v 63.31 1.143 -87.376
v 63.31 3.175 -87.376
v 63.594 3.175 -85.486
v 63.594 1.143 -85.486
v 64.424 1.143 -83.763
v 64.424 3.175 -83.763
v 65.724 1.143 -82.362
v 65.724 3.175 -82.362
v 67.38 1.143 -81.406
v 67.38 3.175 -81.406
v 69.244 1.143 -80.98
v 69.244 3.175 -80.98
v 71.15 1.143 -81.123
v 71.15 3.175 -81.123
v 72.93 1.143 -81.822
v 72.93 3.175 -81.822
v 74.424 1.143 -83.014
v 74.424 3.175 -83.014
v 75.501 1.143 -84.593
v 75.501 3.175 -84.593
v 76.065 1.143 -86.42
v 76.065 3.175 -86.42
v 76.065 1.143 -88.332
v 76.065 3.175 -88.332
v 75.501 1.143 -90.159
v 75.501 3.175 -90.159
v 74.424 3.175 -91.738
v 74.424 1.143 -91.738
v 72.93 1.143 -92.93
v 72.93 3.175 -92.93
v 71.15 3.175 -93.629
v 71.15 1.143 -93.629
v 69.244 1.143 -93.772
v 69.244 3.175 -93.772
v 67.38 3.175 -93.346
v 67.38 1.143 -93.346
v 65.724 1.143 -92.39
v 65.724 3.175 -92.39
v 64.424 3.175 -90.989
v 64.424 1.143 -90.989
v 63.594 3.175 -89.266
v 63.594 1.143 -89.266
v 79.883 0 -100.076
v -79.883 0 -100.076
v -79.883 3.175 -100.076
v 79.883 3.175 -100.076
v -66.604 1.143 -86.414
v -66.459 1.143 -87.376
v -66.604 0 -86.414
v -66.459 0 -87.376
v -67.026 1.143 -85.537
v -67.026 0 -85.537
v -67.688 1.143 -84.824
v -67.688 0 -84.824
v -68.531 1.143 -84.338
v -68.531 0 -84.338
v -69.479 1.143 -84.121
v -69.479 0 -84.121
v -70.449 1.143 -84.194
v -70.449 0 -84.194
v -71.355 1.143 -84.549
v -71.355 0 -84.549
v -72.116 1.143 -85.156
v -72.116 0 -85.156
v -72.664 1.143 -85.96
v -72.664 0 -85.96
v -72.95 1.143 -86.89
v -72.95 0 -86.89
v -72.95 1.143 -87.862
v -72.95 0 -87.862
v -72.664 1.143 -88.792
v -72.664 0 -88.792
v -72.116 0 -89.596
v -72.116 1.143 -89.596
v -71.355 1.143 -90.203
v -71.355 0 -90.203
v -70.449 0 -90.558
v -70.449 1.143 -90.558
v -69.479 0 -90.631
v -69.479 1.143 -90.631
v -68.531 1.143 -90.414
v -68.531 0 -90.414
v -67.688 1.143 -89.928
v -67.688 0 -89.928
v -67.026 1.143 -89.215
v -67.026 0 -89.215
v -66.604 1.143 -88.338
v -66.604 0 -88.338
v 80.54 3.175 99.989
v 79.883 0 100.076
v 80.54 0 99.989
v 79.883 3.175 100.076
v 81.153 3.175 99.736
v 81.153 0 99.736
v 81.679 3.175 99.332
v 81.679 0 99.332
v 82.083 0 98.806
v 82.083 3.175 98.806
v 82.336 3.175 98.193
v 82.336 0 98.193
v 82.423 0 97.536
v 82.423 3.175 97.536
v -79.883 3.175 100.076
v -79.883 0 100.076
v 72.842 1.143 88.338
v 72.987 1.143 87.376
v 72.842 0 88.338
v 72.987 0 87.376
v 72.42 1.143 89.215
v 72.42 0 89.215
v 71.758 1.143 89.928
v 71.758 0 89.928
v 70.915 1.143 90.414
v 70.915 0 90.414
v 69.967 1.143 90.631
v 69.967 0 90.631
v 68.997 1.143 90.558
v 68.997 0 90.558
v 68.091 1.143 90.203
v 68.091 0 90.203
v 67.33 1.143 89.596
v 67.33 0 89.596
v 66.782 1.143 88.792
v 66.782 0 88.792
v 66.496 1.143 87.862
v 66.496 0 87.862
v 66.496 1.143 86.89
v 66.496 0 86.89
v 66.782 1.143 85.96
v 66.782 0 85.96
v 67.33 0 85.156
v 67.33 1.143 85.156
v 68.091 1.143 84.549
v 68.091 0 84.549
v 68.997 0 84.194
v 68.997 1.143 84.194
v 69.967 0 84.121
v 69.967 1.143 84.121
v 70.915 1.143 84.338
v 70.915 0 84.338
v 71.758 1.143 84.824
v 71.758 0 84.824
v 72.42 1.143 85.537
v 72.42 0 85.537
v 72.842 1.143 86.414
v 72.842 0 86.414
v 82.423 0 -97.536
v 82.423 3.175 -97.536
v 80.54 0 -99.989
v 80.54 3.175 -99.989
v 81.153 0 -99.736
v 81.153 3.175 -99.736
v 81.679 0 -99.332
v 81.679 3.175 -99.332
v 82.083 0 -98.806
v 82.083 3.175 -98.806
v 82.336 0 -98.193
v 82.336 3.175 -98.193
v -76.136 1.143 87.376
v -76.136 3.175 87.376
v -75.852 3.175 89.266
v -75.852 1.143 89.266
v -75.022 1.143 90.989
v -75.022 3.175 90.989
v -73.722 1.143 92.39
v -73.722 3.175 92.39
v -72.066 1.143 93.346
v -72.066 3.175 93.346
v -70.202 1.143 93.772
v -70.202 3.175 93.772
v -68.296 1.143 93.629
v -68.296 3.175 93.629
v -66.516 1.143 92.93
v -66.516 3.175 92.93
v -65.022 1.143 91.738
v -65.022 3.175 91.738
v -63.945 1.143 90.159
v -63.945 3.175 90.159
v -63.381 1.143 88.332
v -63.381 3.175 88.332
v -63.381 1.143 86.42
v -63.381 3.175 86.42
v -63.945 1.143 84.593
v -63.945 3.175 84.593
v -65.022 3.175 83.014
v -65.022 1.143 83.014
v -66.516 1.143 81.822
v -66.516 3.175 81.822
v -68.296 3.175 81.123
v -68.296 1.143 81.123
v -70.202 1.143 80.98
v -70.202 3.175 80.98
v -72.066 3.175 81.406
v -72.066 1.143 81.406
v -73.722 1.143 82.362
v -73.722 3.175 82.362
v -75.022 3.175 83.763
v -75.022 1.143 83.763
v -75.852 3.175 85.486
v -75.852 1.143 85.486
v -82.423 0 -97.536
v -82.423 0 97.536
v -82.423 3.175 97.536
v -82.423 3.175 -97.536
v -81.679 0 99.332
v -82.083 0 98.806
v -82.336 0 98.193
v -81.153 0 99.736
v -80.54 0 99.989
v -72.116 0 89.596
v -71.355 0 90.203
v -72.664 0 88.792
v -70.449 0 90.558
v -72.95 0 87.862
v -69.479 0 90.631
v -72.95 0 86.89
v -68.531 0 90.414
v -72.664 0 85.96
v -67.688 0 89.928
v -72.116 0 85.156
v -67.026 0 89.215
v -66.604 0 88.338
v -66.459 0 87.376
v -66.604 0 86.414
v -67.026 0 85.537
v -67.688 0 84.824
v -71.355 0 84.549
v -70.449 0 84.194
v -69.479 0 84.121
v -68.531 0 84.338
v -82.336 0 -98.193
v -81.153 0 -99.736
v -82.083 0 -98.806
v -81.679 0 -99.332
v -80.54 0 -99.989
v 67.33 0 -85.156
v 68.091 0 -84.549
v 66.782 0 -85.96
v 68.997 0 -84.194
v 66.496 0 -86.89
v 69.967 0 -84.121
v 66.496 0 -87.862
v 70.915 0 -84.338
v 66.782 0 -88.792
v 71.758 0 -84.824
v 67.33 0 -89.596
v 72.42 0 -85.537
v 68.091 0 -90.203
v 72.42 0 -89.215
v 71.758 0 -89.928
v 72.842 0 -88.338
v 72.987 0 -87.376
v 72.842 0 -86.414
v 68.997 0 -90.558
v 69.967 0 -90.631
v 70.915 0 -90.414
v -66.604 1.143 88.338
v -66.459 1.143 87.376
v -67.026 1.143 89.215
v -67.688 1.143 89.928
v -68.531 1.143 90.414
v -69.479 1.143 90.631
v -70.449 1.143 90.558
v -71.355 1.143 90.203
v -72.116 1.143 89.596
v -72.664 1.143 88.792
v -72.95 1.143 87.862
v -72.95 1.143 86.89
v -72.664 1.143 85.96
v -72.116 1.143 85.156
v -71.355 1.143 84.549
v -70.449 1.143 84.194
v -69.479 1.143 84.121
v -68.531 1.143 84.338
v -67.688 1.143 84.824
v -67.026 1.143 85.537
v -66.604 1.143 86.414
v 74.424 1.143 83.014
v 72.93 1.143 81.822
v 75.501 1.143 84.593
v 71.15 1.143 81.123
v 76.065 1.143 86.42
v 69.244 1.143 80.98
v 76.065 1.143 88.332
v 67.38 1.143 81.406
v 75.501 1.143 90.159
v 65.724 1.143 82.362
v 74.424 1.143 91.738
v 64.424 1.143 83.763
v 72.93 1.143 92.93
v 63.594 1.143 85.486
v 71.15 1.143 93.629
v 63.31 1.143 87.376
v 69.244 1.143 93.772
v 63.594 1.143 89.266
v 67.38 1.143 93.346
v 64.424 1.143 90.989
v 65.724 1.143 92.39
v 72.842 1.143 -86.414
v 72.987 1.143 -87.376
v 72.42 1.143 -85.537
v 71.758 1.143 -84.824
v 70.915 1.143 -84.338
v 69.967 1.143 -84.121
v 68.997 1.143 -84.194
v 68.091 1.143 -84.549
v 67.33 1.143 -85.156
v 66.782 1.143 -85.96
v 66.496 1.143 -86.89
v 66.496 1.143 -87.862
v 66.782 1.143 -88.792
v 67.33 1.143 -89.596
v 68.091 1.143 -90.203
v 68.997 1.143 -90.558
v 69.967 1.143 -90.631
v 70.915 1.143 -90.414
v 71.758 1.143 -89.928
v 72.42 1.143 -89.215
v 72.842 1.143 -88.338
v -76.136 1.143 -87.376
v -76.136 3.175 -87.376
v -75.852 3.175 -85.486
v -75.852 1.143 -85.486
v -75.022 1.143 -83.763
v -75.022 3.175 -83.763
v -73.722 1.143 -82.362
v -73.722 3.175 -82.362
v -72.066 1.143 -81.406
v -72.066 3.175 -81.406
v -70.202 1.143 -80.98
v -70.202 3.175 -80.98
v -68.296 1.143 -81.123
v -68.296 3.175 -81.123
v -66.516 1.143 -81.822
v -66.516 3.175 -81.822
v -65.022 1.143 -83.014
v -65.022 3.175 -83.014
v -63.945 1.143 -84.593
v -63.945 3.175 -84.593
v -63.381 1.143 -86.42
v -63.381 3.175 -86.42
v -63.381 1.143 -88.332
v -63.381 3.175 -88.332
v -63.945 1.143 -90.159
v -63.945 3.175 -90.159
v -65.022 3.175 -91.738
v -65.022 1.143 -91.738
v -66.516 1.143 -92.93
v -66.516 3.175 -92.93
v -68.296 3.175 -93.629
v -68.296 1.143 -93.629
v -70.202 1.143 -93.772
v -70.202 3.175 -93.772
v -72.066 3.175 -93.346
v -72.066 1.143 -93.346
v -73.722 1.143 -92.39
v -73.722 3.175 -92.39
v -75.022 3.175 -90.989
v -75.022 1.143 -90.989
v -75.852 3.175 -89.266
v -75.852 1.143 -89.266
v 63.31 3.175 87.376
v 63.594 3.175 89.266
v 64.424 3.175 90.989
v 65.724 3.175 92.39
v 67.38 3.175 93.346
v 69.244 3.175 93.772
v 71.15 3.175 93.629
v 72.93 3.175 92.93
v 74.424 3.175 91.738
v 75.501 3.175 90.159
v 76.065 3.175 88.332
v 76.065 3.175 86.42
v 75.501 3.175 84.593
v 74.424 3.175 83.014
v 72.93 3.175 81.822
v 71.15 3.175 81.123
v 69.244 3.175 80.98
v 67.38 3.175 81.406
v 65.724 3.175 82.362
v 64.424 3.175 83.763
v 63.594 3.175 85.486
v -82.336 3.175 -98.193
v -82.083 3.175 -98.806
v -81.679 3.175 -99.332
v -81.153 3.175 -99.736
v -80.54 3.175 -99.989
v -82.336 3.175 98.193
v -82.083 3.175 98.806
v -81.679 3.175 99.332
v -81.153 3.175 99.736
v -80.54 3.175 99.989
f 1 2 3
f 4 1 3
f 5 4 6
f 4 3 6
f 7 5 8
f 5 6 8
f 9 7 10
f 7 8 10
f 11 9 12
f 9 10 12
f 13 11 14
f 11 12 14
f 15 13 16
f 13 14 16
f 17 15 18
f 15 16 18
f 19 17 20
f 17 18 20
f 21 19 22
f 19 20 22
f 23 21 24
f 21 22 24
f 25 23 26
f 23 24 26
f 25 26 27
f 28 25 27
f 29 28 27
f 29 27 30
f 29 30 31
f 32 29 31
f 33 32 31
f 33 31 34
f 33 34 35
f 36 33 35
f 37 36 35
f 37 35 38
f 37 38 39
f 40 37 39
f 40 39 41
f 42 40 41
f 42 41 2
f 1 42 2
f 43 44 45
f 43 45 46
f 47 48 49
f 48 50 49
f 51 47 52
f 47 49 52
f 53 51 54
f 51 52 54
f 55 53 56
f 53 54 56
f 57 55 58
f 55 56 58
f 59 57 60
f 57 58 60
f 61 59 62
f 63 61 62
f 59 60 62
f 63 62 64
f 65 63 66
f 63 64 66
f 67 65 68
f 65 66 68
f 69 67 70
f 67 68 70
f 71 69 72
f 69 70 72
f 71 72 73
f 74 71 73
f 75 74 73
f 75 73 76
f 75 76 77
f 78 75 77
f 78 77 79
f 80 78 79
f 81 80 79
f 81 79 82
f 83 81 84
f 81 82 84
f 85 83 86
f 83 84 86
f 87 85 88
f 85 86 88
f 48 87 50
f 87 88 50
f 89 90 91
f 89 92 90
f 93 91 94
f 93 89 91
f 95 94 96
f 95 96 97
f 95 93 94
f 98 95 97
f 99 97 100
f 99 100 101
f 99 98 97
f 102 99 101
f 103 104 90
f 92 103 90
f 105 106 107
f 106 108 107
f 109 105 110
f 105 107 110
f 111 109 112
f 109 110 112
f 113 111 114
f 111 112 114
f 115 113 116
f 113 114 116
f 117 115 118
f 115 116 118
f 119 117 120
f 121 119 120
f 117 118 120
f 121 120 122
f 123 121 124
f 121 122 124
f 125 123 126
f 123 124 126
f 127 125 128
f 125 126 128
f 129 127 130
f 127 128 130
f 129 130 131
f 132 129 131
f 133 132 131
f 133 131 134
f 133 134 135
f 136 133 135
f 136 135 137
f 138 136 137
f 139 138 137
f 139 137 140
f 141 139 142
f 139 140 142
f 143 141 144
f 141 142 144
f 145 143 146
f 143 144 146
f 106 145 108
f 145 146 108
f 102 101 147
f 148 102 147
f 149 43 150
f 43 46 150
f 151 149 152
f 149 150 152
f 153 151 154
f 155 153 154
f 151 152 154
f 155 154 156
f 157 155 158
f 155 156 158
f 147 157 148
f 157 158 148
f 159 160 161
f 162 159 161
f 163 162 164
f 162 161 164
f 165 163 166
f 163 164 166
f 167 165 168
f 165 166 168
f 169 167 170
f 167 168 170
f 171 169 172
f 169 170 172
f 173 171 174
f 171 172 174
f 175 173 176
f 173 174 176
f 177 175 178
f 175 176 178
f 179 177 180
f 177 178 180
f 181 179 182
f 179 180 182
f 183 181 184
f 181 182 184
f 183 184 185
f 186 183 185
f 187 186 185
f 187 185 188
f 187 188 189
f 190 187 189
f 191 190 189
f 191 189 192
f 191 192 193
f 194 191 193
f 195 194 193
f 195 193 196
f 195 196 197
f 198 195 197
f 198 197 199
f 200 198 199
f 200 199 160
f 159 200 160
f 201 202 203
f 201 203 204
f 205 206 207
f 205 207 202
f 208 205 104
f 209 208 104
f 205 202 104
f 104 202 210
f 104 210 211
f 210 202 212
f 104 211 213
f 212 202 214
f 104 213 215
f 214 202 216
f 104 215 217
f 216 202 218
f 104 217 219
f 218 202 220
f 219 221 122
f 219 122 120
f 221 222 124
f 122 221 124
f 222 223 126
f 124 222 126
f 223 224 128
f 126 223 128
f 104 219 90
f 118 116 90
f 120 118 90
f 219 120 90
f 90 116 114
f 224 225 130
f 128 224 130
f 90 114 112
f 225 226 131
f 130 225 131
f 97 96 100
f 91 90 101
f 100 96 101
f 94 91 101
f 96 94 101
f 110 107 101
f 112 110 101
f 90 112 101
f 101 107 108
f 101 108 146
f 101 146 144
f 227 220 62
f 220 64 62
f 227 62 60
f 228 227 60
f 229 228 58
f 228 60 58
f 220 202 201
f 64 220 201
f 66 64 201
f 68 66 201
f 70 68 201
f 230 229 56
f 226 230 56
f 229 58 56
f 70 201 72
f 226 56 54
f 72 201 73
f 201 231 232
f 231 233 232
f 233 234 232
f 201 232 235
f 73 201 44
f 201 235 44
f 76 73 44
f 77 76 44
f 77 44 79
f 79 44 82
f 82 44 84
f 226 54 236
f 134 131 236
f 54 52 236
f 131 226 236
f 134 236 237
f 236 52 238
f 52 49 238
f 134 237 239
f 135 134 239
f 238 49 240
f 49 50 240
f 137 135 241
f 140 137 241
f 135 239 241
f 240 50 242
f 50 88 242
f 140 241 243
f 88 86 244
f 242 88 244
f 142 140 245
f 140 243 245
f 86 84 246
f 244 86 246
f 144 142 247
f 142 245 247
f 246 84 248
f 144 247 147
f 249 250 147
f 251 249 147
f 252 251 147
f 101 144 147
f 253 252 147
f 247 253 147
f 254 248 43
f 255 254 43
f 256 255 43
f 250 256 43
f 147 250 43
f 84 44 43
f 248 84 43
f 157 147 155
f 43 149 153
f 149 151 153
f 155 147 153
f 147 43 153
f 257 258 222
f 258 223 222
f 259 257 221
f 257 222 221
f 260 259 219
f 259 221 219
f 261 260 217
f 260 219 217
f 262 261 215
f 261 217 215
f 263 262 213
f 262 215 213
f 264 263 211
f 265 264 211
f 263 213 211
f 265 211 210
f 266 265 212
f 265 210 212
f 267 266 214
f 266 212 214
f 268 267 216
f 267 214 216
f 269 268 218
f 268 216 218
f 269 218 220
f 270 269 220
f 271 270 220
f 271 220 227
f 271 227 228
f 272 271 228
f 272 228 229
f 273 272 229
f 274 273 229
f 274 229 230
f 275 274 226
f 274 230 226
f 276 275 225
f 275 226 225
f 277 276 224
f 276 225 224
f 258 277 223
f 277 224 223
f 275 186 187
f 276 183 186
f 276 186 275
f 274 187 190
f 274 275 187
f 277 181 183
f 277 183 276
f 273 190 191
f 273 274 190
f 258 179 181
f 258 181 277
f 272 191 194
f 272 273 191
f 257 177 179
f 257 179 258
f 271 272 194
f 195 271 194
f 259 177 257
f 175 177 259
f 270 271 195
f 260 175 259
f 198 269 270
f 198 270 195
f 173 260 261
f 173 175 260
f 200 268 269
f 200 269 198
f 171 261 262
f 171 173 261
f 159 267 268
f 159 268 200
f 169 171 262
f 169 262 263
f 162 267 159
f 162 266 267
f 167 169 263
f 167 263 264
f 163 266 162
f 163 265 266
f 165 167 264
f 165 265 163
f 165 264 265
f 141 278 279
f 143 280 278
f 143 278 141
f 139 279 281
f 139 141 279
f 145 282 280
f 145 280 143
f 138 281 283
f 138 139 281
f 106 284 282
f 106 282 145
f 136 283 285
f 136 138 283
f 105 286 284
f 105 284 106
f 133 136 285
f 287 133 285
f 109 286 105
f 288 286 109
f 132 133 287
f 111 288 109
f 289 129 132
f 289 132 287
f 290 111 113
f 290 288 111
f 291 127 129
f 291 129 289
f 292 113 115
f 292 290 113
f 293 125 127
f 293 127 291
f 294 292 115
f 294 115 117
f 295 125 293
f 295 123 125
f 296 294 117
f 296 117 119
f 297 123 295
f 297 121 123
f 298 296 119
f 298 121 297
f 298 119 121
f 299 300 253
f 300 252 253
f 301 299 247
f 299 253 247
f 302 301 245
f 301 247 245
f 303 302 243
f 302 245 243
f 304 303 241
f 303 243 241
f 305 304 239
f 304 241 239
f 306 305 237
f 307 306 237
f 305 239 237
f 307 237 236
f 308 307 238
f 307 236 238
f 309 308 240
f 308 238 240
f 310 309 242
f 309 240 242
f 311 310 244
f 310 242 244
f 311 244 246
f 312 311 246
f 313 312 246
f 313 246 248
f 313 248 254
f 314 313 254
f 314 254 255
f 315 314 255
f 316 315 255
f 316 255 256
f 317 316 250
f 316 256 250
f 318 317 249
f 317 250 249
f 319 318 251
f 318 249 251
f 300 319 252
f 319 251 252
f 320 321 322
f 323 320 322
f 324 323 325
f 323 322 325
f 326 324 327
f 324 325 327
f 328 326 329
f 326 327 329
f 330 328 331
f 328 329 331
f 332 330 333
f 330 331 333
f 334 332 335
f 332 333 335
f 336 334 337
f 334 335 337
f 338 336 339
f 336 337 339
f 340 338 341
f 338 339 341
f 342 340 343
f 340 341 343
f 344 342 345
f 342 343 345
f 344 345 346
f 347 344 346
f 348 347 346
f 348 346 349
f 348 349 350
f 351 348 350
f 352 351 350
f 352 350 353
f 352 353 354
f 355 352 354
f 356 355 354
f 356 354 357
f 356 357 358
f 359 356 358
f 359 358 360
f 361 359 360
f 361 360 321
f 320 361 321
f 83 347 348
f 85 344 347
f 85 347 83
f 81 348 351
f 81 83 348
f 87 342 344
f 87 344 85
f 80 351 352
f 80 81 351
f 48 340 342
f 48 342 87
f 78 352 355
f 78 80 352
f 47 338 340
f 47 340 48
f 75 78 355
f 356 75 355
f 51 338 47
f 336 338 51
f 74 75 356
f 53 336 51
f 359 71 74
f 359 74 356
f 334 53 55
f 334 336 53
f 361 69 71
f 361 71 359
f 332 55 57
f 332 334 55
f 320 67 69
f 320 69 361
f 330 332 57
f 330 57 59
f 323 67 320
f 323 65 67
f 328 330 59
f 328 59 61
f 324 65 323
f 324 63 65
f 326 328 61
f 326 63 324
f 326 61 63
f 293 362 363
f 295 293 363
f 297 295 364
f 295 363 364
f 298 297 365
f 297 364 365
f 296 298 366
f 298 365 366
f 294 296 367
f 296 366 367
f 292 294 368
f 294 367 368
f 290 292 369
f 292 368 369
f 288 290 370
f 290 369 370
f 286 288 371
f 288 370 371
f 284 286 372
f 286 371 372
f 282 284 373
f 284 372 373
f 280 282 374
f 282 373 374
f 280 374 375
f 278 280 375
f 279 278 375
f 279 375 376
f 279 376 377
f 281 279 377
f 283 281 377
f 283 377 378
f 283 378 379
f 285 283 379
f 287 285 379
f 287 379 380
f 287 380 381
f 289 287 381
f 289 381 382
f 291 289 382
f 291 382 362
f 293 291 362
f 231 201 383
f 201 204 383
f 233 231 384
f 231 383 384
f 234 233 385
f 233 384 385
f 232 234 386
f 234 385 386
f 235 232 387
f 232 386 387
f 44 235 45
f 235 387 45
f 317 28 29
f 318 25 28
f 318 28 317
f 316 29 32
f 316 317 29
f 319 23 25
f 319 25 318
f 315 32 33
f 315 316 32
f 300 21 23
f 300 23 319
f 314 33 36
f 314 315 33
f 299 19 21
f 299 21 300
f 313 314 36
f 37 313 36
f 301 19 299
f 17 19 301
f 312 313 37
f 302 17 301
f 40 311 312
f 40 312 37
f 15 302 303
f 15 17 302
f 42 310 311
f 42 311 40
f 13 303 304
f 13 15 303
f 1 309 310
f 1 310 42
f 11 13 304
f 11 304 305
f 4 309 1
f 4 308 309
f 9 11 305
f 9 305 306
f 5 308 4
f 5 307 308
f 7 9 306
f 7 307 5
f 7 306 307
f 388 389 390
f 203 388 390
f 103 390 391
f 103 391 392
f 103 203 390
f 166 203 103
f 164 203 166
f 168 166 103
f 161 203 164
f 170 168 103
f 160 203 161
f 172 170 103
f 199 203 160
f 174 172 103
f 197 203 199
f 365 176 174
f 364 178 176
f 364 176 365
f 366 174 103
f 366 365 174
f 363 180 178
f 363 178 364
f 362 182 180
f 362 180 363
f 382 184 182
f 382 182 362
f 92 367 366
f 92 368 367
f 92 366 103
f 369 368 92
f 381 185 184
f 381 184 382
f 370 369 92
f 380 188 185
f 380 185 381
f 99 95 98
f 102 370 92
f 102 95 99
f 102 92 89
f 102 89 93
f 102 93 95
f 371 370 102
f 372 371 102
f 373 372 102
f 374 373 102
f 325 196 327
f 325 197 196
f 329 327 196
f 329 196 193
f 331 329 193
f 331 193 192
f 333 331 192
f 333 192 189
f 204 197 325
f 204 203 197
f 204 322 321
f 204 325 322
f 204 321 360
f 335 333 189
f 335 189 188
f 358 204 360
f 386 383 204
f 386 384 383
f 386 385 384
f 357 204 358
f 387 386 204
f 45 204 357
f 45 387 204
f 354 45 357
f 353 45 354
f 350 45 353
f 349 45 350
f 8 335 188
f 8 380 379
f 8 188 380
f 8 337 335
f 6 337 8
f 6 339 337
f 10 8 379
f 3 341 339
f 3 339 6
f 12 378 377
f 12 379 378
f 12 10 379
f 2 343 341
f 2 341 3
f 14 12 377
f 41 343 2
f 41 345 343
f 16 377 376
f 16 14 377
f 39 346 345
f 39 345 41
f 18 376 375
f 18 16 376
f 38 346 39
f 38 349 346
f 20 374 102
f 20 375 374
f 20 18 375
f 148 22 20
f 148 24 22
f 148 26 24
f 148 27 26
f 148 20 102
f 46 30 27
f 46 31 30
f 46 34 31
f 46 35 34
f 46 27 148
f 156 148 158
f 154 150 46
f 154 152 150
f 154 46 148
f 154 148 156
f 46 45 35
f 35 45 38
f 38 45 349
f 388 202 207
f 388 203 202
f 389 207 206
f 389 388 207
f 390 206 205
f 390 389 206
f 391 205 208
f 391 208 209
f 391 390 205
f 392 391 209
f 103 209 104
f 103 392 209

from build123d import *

# Parameters (mm, degrees)
SKETCH1_W                                        = 164.846
SKETCH1_H                                        = 200.152
BOSS_EXTRUDE1_DEPTH                              = 3.175
CBORE_FOR_1_4_SOCKET_HEAD_CAP_SCREW1_D           = 6.5278
CBORE_FOR_1_4_SOCKET_HEAD_CAP_SCREW1_CBORE_D     = 12.827
CBORE_FOR_1_4_SOCKET_HEAD_CAP_SCREW1_CBORE_DEPTH = 2.032
FILLET1_R                                        = 2.54


with BuildPart() as part:
    # Sketch1 → Boss-Extrude1 (new body)
    with BuildSketch(Plane(origin=(0, 0, 0), x_dir=(1, 0, 0), z_dir=(0, 1, 0))):
        Rectangle(SKETCH1_W, SKETCH1_H)
    extrude(amount=BOSS_EXTRUDE1_DEPTH)

    # CBORE for 1/4 Socket Head Cap Screw1 (through all)
    with Locations(Plane(origin=(0, 3.175, 0), x_dir=(-1, 0, 0), z_dir=(0, 1, 0))):
        with Locations((69.723, 87.376), (69.723, -87.376), (-69.723, 87.376), (-69.723, -87.376)):
            CounterBoreHole(CBORE_FOR_1_4_SOCKET_HEAD_CAP_SCREW1_D / 2, CBORE_FOR_1_4_SOCKET_HEAD_CAP_SCREW1_CBORE_D / 2, CBORE_FOR_1_4_SOCKET_HEAD_CAP_SCREW1_CBORE_DEPTH)

    # Fillet1
    fillet1_edges = [part.edges().sort_by_distance(p)[0] for p in [
        (82.423, 1.5875, 100.076),
        (-82.423, 1.5875, 100.076),
        (-82.423, 1.5875, -100.076),
        (82.423, 1.5875, -100.076),
    ]]
    fillet(fillet1_edges, radius=FILLET1_R)


solid = part.part
